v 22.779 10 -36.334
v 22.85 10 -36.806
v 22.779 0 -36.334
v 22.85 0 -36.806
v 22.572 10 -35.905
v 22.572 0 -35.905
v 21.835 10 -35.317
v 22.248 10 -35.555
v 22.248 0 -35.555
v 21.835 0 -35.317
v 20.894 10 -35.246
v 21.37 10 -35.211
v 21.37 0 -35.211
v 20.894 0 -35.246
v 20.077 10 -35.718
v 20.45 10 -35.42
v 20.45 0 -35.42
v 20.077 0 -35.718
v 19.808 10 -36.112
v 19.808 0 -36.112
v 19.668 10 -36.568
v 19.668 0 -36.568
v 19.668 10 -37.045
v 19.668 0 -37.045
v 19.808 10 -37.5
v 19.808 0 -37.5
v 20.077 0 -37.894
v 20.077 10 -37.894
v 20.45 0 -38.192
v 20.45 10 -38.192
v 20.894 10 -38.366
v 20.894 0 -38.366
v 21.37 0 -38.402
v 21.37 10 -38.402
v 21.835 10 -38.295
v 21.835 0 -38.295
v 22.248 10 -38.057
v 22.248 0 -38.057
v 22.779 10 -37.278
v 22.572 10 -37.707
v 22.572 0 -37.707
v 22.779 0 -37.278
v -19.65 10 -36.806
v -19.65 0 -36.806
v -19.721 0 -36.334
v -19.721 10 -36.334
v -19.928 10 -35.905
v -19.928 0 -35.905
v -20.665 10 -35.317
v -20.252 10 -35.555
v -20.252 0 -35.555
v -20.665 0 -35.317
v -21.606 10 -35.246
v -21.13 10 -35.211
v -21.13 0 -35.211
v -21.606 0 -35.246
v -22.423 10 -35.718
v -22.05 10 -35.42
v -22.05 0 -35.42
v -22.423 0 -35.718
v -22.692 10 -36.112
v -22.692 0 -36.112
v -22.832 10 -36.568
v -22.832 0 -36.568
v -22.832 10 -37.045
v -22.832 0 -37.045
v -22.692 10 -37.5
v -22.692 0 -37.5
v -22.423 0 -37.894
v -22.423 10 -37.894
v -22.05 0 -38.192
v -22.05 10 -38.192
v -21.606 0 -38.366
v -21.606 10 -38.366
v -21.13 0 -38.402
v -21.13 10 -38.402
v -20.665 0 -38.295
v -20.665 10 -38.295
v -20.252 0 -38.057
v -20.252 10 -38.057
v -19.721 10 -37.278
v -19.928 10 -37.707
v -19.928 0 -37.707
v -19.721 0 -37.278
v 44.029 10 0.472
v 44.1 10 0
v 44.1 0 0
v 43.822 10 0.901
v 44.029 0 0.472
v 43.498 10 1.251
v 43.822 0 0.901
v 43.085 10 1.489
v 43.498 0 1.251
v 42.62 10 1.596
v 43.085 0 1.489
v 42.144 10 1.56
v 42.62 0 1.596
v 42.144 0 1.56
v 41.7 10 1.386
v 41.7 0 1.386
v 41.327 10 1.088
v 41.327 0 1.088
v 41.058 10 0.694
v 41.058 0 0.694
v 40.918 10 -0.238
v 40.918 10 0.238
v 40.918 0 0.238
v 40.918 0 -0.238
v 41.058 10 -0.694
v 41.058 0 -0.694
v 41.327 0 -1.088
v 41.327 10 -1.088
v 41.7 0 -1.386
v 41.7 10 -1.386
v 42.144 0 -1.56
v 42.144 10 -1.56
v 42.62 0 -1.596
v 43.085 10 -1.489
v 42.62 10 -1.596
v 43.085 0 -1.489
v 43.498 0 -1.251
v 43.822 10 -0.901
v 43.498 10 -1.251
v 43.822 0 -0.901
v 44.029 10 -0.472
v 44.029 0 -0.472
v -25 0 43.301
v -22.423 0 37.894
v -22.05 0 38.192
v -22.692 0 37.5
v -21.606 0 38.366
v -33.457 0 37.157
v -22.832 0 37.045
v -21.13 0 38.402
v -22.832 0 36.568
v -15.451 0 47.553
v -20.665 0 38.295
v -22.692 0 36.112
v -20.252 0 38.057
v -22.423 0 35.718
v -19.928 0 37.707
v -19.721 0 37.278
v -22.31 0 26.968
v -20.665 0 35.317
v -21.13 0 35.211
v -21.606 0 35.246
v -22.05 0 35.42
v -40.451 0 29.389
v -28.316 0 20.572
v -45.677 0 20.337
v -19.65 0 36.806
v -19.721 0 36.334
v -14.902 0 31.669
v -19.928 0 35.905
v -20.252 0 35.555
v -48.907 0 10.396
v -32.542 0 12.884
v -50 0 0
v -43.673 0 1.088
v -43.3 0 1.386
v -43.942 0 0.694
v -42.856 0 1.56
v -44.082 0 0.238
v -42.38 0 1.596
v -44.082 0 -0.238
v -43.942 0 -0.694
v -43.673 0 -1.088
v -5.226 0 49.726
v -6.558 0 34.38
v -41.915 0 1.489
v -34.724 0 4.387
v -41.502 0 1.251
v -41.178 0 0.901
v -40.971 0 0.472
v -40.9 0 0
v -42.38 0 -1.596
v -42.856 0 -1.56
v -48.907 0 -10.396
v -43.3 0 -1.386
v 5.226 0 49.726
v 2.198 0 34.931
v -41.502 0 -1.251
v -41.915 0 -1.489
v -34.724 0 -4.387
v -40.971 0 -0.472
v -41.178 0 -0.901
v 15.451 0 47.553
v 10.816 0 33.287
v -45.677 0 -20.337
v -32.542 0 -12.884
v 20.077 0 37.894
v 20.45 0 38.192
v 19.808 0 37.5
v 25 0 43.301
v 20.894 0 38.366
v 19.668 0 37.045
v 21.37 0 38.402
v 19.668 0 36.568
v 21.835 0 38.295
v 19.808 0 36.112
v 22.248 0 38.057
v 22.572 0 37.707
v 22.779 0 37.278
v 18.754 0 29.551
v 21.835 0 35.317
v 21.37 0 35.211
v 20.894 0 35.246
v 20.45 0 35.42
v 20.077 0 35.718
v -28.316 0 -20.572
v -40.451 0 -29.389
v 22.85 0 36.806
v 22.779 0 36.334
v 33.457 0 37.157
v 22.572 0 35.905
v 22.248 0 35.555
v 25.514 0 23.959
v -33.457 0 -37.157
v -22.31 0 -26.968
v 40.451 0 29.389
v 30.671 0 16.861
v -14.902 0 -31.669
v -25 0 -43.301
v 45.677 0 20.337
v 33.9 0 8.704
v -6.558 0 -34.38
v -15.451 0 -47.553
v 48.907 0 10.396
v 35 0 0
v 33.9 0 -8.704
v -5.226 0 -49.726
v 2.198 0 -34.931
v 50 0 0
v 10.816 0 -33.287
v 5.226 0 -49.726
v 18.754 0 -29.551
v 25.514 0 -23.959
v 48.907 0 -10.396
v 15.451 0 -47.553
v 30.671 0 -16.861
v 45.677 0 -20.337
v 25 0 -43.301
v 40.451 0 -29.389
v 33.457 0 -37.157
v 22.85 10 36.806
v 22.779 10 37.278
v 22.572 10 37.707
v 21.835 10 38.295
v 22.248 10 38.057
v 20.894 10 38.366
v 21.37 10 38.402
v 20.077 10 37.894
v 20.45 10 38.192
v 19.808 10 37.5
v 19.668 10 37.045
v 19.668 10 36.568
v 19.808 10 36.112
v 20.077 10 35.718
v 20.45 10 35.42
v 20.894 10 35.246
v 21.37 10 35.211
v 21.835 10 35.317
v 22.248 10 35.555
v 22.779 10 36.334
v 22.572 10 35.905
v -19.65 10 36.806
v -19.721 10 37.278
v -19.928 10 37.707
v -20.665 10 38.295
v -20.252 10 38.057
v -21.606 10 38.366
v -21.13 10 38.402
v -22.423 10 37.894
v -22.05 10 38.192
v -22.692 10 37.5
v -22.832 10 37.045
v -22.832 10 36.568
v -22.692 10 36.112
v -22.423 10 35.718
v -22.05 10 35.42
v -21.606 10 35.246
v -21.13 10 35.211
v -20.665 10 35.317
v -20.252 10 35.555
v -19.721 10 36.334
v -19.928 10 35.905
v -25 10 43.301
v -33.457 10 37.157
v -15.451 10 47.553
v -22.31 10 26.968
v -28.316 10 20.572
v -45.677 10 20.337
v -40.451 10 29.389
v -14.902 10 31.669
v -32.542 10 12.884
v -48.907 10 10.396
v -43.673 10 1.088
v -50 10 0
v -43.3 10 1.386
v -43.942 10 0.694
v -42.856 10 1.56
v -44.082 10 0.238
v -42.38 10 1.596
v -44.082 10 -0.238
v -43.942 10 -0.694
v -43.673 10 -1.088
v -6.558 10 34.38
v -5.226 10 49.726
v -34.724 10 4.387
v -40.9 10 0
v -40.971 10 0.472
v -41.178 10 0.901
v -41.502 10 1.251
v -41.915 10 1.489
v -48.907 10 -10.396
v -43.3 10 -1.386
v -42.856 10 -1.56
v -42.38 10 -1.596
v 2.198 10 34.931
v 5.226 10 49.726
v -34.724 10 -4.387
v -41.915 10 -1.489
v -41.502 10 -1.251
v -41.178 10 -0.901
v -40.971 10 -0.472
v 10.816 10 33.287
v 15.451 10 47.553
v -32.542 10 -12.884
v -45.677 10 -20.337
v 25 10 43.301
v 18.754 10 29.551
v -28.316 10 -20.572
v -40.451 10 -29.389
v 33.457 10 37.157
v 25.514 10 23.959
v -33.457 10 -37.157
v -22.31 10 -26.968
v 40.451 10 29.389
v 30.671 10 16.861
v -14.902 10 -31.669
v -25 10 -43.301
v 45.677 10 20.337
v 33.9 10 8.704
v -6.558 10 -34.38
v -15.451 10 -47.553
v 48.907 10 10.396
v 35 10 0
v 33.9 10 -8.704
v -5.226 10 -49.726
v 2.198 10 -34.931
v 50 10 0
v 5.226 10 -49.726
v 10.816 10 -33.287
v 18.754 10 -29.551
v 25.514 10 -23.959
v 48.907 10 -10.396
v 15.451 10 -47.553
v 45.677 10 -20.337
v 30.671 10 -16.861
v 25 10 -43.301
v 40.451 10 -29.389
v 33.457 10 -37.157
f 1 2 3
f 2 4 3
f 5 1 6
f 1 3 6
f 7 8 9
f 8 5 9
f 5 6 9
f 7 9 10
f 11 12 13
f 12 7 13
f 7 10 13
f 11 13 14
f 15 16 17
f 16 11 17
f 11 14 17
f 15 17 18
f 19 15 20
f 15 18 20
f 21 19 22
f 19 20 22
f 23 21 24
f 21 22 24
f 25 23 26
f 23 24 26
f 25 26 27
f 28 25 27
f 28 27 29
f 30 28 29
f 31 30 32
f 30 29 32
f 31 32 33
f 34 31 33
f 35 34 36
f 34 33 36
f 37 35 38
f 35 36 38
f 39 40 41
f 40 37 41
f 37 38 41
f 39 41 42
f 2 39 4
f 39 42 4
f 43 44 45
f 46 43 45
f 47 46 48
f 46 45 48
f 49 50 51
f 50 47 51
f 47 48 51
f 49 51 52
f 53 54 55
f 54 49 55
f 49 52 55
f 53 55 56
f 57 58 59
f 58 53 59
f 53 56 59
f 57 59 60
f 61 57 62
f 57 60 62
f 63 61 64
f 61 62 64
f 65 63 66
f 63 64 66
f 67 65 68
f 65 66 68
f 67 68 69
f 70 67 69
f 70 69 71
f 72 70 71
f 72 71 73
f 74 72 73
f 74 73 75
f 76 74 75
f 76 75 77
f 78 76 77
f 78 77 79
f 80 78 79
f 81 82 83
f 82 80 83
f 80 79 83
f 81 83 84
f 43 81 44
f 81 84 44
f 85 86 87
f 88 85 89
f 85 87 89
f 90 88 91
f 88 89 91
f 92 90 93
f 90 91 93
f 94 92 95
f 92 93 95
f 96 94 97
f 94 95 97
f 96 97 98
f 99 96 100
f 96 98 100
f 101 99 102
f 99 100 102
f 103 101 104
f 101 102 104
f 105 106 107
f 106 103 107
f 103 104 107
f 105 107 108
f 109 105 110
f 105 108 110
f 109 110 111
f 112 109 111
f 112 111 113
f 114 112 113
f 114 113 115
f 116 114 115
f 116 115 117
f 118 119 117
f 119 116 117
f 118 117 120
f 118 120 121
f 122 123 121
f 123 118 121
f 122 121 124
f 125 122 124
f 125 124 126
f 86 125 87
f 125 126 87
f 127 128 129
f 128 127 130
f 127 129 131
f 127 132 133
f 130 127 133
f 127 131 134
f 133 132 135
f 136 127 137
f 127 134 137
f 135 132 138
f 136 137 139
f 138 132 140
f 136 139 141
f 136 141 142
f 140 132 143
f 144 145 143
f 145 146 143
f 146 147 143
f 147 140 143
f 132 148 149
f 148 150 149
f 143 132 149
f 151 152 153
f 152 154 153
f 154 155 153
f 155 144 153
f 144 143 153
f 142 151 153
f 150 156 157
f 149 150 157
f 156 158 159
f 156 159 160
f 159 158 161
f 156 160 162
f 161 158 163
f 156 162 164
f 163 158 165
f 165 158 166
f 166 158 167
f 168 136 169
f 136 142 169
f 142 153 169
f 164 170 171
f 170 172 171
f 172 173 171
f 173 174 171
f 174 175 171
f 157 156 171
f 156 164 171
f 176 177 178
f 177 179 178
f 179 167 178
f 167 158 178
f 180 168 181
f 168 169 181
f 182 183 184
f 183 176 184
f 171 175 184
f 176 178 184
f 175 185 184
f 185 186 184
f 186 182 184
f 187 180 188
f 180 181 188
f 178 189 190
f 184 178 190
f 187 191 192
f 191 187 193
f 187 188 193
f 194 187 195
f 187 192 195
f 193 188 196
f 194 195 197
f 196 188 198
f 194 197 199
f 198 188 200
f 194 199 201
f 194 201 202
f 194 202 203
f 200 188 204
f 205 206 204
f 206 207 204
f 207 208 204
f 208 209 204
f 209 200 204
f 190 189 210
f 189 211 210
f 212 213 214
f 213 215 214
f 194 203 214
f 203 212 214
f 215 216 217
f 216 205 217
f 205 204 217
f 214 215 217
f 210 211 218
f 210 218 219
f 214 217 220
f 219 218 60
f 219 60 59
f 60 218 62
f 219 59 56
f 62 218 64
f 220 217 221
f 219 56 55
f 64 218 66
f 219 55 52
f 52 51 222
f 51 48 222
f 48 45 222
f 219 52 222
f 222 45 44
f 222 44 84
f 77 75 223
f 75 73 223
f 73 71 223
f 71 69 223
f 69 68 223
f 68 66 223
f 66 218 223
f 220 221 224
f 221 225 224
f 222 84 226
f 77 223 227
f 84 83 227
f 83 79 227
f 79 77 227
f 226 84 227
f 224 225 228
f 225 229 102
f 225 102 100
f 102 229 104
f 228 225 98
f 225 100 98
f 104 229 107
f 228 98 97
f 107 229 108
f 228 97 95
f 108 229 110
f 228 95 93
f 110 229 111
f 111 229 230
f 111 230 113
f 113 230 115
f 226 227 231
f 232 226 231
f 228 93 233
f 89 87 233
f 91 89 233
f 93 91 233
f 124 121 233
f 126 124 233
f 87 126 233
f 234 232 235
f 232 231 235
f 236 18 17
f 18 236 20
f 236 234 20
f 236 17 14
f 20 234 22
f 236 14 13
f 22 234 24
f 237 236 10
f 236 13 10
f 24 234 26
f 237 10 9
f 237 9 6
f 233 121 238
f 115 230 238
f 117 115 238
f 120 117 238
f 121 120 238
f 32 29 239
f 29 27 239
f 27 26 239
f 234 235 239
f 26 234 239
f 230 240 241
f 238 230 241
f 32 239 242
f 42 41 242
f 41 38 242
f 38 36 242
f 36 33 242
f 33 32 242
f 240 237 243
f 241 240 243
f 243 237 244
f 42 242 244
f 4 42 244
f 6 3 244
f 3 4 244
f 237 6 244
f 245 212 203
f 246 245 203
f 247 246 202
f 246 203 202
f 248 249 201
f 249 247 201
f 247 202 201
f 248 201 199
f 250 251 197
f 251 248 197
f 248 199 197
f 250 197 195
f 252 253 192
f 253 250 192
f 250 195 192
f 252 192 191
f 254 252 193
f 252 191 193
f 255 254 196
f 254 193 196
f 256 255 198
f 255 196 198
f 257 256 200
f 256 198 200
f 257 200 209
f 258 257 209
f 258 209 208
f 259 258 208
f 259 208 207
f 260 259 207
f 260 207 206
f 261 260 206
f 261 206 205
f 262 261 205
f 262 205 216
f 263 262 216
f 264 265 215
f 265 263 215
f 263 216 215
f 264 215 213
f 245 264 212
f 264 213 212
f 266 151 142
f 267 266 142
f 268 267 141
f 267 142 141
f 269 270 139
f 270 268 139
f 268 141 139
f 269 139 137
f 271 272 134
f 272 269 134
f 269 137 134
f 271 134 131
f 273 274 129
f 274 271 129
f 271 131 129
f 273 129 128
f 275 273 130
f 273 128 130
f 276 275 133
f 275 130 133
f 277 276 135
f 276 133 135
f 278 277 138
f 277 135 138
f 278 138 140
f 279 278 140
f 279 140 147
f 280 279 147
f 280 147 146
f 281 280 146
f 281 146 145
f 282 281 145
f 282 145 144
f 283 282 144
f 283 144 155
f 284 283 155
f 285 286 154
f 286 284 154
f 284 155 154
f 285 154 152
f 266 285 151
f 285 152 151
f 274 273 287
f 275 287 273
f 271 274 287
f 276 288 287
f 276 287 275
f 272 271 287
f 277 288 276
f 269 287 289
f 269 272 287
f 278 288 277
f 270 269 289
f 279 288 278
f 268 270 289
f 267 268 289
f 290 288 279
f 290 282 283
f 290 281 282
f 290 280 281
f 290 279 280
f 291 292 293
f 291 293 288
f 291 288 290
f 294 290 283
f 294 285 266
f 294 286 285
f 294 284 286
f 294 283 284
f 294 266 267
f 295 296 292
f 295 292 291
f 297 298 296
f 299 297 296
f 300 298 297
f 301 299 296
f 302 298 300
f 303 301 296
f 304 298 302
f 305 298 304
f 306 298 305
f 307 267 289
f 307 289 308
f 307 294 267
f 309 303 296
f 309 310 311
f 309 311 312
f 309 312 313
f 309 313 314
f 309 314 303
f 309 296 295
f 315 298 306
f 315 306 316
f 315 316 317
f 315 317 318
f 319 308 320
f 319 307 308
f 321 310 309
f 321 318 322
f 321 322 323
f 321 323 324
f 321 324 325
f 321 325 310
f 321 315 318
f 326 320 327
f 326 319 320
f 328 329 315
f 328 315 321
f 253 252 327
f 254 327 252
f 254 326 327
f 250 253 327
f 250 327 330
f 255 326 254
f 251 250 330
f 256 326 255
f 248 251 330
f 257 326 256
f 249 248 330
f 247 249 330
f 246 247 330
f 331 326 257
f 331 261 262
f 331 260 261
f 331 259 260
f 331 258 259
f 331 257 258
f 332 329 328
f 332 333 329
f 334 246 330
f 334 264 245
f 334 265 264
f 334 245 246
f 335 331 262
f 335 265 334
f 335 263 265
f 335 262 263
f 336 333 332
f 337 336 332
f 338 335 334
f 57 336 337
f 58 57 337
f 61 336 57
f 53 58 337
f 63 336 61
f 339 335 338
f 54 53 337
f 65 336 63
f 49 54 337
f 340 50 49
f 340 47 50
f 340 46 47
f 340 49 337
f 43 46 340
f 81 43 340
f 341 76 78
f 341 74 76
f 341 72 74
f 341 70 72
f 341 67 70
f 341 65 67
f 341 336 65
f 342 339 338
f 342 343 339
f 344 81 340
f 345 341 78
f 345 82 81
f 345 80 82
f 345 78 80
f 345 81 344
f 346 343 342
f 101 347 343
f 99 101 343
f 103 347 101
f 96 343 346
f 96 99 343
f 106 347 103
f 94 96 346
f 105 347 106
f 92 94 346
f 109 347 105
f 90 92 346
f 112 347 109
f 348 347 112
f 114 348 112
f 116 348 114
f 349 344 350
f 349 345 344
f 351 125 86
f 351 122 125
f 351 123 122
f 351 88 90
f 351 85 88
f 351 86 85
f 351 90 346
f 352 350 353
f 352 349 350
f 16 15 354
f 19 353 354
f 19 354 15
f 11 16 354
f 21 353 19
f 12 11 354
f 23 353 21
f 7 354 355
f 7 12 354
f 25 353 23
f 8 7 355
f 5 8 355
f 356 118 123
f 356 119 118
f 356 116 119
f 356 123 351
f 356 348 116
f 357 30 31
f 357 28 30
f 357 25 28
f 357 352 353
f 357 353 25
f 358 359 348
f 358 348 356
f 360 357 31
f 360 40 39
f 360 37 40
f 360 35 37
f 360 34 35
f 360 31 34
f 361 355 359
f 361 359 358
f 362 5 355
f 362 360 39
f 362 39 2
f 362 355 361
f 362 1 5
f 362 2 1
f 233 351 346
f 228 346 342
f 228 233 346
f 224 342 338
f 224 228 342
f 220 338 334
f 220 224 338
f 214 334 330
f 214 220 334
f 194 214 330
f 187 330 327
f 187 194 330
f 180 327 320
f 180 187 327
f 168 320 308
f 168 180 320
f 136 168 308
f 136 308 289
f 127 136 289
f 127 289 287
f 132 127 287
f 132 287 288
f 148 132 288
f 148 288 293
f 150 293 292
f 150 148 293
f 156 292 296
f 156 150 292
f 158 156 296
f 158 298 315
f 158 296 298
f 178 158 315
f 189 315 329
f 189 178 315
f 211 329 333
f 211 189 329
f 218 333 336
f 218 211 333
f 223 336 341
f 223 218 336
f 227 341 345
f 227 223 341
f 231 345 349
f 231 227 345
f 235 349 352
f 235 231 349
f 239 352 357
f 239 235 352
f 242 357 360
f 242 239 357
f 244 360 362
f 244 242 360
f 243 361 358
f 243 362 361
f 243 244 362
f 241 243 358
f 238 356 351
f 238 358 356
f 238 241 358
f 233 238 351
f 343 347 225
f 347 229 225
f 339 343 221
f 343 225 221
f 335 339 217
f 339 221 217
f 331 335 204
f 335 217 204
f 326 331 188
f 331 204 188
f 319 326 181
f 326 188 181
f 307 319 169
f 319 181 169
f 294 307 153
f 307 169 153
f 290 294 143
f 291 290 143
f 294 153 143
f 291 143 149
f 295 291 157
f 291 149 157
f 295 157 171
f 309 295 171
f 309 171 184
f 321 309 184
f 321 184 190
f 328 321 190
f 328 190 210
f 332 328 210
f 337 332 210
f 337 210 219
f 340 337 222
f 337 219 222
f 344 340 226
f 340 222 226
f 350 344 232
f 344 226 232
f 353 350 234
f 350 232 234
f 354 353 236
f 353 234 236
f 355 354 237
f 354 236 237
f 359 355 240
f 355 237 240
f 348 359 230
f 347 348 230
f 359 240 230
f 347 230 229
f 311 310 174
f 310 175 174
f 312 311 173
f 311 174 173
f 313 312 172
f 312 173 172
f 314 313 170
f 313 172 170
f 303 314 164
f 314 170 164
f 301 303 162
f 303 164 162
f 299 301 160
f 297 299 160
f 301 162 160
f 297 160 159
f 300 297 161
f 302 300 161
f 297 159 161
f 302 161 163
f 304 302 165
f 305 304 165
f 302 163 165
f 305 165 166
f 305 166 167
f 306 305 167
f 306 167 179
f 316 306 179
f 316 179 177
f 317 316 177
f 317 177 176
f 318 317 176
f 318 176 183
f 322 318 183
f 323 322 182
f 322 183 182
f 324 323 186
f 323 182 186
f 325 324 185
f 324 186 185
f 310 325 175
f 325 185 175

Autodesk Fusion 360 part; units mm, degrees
sketch "Esquisse1" plane through (0, 0, 0) normal (0, 1, 0) x (1, 0, 0)
  circle A0 centre (0, 0) radius 35
  circle A1 centre (0, 0) radius 50
  line L0 (42.5, 0) -> (21.25, 36.8061) construction
  line L1 (21.25, 36.8061) -> (-21.25, 36.8061) construction
  line L2 (-21.25, 36.8061) -> (-42.5, 0) construction
  line L3 (-42.5, 0) -> (-21.25, -36.8061) construction
  line L4 (-21.25, -36.8061) -> (21.25, -36.8061) construction
  line L5 (21.25, -36.8061) -> (42.5, 0) construction
  circle A2 centre (0, 0) radius 42.5 construction
  line L6 (50, 0) -> (-50, 0)
  line L7 (0, -50) -> (0, 50)
  circle A3 centre (21.25, -36.8061) radius 1.6
  circle A4 centre (-21.25, -36.8061) radius 1.6
  circle A5 centre (-42.5, 0) radius 1.6
  circle A6 centre (-21.25, 36.8061) radius 1.6
  circle A7 centre (21.25, 36.8061) radius 1.6
  circle A8 centre (42.5, 0) radius 1.6
  dimension "d1" = 70
  dimension "d2" = 15
  dimension "d5" = 7.5
  dimension "d6" = 3.2
extrude "Extrusion1" add sketch "Esquisse1" along normal blind 10 contours A0 A1 L6 L7 A8 | A0 A1 L6 L7 A8 | A0 A1 L6 L7 A5 | A0 A1 L6 L7 A5
